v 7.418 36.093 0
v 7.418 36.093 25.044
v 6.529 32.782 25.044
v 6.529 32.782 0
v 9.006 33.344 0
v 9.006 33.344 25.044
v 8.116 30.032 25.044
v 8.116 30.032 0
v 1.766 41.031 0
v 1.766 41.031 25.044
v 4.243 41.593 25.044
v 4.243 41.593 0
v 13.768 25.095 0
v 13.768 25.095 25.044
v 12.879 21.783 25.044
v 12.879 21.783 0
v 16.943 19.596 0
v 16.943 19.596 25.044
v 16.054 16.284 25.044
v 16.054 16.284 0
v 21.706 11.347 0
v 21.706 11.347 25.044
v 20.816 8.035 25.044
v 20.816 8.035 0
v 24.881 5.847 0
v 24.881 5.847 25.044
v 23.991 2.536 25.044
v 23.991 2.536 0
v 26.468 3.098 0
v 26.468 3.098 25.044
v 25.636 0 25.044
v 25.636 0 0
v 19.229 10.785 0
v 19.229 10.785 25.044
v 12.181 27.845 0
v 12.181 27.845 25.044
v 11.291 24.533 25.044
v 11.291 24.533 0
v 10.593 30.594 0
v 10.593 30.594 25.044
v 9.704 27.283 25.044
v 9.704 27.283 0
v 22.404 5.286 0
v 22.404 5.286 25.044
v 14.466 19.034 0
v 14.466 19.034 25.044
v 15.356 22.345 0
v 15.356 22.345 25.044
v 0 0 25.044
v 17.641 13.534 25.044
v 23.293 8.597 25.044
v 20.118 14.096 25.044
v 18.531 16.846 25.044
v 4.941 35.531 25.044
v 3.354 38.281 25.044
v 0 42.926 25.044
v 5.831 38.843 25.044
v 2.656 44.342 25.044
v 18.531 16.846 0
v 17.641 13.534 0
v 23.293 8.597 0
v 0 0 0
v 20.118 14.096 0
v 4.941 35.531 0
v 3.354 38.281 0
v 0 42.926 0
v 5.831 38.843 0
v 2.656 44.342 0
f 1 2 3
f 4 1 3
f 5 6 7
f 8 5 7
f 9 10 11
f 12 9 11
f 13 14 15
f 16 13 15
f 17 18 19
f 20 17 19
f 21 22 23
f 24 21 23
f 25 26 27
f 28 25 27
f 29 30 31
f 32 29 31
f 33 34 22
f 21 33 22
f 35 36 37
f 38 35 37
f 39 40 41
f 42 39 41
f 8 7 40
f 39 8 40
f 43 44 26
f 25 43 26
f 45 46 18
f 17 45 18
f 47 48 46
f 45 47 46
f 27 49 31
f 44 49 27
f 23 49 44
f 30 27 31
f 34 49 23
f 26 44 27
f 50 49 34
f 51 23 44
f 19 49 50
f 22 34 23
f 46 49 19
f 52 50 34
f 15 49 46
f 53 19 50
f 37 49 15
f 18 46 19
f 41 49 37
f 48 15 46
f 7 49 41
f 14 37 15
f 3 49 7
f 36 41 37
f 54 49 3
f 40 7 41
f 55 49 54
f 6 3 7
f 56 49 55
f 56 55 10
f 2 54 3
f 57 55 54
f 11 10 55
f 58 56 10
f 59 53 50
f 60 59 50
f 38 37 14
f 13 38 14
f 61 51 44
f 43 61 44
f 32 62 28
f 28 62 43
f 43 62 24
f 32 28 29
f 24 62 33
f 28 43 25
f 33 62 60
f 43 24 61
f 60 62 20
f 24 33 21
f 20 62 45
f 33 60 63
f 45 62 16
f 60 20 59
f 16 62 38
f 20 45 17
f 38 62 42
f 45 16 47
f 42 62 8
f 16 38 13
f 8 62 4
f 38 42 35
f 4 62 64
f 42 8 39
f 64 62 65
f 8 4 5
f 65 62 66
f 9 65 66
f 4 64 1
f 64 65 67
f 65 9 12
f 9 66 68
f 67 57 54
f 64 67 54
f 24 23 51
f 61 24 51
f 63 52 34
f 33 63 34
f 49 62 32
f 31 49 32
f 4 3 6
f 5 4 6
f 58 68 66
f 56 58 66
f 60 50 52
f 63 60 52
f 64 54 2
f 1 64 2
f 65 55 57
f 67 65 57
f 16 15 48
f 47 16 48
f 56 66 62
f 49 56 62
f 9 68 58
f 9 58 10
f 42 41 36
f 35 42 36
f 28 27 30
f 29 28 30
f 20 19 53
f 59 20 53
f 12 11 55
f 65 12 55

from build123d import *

# Parameters (mm, degrees)
BOSS_EXTRUDE1_DEPTH = 25.0444
CUT_EXTRUDE1_DEPTH  = 58.602407639
LPATTERN1_COUNT     = 17
LPATTERN1_PITCH     = 3.175


with BuildPart() as part:
    # Sketch1 → Boss-Extrude1 (new body)
    with BuildSketch(Plane.XY):
        Polygon((0, 42.926), (0, 0), (25.908, 0), (26.917900092, 2.319009706), (2.655725985, 44.342327962), align=None)
    extrude(amount=BOSS_EXTRUDE1_DEPTH)

    # Sketch2 → Cut-Extrude1 (cut, through all)
    with BuildSketch(Plane.XY.offset(25.0444)):
        Polygon((2.655725985, 44.342327962), (1.766174751, 41.030721161), (4.243225985, 41.592697305), align=None)
    cut_extrude1 = extrude(amount=-CUT_EXTRUDE1_DEPTH, mode=Mode.SUBTRACT)

    # LPattern1: Cut-Extrude1 ×17
    with Locations(*[Vector(0.5000000000000007, -0.8660254037844384, 0) * (i * LPATTERN1_PITCH) for i in range(1, LPATTERN1_COUNT)]):
        add(cut_extrude1, mode=Mode.SUBTRACT)


solid = part.part
